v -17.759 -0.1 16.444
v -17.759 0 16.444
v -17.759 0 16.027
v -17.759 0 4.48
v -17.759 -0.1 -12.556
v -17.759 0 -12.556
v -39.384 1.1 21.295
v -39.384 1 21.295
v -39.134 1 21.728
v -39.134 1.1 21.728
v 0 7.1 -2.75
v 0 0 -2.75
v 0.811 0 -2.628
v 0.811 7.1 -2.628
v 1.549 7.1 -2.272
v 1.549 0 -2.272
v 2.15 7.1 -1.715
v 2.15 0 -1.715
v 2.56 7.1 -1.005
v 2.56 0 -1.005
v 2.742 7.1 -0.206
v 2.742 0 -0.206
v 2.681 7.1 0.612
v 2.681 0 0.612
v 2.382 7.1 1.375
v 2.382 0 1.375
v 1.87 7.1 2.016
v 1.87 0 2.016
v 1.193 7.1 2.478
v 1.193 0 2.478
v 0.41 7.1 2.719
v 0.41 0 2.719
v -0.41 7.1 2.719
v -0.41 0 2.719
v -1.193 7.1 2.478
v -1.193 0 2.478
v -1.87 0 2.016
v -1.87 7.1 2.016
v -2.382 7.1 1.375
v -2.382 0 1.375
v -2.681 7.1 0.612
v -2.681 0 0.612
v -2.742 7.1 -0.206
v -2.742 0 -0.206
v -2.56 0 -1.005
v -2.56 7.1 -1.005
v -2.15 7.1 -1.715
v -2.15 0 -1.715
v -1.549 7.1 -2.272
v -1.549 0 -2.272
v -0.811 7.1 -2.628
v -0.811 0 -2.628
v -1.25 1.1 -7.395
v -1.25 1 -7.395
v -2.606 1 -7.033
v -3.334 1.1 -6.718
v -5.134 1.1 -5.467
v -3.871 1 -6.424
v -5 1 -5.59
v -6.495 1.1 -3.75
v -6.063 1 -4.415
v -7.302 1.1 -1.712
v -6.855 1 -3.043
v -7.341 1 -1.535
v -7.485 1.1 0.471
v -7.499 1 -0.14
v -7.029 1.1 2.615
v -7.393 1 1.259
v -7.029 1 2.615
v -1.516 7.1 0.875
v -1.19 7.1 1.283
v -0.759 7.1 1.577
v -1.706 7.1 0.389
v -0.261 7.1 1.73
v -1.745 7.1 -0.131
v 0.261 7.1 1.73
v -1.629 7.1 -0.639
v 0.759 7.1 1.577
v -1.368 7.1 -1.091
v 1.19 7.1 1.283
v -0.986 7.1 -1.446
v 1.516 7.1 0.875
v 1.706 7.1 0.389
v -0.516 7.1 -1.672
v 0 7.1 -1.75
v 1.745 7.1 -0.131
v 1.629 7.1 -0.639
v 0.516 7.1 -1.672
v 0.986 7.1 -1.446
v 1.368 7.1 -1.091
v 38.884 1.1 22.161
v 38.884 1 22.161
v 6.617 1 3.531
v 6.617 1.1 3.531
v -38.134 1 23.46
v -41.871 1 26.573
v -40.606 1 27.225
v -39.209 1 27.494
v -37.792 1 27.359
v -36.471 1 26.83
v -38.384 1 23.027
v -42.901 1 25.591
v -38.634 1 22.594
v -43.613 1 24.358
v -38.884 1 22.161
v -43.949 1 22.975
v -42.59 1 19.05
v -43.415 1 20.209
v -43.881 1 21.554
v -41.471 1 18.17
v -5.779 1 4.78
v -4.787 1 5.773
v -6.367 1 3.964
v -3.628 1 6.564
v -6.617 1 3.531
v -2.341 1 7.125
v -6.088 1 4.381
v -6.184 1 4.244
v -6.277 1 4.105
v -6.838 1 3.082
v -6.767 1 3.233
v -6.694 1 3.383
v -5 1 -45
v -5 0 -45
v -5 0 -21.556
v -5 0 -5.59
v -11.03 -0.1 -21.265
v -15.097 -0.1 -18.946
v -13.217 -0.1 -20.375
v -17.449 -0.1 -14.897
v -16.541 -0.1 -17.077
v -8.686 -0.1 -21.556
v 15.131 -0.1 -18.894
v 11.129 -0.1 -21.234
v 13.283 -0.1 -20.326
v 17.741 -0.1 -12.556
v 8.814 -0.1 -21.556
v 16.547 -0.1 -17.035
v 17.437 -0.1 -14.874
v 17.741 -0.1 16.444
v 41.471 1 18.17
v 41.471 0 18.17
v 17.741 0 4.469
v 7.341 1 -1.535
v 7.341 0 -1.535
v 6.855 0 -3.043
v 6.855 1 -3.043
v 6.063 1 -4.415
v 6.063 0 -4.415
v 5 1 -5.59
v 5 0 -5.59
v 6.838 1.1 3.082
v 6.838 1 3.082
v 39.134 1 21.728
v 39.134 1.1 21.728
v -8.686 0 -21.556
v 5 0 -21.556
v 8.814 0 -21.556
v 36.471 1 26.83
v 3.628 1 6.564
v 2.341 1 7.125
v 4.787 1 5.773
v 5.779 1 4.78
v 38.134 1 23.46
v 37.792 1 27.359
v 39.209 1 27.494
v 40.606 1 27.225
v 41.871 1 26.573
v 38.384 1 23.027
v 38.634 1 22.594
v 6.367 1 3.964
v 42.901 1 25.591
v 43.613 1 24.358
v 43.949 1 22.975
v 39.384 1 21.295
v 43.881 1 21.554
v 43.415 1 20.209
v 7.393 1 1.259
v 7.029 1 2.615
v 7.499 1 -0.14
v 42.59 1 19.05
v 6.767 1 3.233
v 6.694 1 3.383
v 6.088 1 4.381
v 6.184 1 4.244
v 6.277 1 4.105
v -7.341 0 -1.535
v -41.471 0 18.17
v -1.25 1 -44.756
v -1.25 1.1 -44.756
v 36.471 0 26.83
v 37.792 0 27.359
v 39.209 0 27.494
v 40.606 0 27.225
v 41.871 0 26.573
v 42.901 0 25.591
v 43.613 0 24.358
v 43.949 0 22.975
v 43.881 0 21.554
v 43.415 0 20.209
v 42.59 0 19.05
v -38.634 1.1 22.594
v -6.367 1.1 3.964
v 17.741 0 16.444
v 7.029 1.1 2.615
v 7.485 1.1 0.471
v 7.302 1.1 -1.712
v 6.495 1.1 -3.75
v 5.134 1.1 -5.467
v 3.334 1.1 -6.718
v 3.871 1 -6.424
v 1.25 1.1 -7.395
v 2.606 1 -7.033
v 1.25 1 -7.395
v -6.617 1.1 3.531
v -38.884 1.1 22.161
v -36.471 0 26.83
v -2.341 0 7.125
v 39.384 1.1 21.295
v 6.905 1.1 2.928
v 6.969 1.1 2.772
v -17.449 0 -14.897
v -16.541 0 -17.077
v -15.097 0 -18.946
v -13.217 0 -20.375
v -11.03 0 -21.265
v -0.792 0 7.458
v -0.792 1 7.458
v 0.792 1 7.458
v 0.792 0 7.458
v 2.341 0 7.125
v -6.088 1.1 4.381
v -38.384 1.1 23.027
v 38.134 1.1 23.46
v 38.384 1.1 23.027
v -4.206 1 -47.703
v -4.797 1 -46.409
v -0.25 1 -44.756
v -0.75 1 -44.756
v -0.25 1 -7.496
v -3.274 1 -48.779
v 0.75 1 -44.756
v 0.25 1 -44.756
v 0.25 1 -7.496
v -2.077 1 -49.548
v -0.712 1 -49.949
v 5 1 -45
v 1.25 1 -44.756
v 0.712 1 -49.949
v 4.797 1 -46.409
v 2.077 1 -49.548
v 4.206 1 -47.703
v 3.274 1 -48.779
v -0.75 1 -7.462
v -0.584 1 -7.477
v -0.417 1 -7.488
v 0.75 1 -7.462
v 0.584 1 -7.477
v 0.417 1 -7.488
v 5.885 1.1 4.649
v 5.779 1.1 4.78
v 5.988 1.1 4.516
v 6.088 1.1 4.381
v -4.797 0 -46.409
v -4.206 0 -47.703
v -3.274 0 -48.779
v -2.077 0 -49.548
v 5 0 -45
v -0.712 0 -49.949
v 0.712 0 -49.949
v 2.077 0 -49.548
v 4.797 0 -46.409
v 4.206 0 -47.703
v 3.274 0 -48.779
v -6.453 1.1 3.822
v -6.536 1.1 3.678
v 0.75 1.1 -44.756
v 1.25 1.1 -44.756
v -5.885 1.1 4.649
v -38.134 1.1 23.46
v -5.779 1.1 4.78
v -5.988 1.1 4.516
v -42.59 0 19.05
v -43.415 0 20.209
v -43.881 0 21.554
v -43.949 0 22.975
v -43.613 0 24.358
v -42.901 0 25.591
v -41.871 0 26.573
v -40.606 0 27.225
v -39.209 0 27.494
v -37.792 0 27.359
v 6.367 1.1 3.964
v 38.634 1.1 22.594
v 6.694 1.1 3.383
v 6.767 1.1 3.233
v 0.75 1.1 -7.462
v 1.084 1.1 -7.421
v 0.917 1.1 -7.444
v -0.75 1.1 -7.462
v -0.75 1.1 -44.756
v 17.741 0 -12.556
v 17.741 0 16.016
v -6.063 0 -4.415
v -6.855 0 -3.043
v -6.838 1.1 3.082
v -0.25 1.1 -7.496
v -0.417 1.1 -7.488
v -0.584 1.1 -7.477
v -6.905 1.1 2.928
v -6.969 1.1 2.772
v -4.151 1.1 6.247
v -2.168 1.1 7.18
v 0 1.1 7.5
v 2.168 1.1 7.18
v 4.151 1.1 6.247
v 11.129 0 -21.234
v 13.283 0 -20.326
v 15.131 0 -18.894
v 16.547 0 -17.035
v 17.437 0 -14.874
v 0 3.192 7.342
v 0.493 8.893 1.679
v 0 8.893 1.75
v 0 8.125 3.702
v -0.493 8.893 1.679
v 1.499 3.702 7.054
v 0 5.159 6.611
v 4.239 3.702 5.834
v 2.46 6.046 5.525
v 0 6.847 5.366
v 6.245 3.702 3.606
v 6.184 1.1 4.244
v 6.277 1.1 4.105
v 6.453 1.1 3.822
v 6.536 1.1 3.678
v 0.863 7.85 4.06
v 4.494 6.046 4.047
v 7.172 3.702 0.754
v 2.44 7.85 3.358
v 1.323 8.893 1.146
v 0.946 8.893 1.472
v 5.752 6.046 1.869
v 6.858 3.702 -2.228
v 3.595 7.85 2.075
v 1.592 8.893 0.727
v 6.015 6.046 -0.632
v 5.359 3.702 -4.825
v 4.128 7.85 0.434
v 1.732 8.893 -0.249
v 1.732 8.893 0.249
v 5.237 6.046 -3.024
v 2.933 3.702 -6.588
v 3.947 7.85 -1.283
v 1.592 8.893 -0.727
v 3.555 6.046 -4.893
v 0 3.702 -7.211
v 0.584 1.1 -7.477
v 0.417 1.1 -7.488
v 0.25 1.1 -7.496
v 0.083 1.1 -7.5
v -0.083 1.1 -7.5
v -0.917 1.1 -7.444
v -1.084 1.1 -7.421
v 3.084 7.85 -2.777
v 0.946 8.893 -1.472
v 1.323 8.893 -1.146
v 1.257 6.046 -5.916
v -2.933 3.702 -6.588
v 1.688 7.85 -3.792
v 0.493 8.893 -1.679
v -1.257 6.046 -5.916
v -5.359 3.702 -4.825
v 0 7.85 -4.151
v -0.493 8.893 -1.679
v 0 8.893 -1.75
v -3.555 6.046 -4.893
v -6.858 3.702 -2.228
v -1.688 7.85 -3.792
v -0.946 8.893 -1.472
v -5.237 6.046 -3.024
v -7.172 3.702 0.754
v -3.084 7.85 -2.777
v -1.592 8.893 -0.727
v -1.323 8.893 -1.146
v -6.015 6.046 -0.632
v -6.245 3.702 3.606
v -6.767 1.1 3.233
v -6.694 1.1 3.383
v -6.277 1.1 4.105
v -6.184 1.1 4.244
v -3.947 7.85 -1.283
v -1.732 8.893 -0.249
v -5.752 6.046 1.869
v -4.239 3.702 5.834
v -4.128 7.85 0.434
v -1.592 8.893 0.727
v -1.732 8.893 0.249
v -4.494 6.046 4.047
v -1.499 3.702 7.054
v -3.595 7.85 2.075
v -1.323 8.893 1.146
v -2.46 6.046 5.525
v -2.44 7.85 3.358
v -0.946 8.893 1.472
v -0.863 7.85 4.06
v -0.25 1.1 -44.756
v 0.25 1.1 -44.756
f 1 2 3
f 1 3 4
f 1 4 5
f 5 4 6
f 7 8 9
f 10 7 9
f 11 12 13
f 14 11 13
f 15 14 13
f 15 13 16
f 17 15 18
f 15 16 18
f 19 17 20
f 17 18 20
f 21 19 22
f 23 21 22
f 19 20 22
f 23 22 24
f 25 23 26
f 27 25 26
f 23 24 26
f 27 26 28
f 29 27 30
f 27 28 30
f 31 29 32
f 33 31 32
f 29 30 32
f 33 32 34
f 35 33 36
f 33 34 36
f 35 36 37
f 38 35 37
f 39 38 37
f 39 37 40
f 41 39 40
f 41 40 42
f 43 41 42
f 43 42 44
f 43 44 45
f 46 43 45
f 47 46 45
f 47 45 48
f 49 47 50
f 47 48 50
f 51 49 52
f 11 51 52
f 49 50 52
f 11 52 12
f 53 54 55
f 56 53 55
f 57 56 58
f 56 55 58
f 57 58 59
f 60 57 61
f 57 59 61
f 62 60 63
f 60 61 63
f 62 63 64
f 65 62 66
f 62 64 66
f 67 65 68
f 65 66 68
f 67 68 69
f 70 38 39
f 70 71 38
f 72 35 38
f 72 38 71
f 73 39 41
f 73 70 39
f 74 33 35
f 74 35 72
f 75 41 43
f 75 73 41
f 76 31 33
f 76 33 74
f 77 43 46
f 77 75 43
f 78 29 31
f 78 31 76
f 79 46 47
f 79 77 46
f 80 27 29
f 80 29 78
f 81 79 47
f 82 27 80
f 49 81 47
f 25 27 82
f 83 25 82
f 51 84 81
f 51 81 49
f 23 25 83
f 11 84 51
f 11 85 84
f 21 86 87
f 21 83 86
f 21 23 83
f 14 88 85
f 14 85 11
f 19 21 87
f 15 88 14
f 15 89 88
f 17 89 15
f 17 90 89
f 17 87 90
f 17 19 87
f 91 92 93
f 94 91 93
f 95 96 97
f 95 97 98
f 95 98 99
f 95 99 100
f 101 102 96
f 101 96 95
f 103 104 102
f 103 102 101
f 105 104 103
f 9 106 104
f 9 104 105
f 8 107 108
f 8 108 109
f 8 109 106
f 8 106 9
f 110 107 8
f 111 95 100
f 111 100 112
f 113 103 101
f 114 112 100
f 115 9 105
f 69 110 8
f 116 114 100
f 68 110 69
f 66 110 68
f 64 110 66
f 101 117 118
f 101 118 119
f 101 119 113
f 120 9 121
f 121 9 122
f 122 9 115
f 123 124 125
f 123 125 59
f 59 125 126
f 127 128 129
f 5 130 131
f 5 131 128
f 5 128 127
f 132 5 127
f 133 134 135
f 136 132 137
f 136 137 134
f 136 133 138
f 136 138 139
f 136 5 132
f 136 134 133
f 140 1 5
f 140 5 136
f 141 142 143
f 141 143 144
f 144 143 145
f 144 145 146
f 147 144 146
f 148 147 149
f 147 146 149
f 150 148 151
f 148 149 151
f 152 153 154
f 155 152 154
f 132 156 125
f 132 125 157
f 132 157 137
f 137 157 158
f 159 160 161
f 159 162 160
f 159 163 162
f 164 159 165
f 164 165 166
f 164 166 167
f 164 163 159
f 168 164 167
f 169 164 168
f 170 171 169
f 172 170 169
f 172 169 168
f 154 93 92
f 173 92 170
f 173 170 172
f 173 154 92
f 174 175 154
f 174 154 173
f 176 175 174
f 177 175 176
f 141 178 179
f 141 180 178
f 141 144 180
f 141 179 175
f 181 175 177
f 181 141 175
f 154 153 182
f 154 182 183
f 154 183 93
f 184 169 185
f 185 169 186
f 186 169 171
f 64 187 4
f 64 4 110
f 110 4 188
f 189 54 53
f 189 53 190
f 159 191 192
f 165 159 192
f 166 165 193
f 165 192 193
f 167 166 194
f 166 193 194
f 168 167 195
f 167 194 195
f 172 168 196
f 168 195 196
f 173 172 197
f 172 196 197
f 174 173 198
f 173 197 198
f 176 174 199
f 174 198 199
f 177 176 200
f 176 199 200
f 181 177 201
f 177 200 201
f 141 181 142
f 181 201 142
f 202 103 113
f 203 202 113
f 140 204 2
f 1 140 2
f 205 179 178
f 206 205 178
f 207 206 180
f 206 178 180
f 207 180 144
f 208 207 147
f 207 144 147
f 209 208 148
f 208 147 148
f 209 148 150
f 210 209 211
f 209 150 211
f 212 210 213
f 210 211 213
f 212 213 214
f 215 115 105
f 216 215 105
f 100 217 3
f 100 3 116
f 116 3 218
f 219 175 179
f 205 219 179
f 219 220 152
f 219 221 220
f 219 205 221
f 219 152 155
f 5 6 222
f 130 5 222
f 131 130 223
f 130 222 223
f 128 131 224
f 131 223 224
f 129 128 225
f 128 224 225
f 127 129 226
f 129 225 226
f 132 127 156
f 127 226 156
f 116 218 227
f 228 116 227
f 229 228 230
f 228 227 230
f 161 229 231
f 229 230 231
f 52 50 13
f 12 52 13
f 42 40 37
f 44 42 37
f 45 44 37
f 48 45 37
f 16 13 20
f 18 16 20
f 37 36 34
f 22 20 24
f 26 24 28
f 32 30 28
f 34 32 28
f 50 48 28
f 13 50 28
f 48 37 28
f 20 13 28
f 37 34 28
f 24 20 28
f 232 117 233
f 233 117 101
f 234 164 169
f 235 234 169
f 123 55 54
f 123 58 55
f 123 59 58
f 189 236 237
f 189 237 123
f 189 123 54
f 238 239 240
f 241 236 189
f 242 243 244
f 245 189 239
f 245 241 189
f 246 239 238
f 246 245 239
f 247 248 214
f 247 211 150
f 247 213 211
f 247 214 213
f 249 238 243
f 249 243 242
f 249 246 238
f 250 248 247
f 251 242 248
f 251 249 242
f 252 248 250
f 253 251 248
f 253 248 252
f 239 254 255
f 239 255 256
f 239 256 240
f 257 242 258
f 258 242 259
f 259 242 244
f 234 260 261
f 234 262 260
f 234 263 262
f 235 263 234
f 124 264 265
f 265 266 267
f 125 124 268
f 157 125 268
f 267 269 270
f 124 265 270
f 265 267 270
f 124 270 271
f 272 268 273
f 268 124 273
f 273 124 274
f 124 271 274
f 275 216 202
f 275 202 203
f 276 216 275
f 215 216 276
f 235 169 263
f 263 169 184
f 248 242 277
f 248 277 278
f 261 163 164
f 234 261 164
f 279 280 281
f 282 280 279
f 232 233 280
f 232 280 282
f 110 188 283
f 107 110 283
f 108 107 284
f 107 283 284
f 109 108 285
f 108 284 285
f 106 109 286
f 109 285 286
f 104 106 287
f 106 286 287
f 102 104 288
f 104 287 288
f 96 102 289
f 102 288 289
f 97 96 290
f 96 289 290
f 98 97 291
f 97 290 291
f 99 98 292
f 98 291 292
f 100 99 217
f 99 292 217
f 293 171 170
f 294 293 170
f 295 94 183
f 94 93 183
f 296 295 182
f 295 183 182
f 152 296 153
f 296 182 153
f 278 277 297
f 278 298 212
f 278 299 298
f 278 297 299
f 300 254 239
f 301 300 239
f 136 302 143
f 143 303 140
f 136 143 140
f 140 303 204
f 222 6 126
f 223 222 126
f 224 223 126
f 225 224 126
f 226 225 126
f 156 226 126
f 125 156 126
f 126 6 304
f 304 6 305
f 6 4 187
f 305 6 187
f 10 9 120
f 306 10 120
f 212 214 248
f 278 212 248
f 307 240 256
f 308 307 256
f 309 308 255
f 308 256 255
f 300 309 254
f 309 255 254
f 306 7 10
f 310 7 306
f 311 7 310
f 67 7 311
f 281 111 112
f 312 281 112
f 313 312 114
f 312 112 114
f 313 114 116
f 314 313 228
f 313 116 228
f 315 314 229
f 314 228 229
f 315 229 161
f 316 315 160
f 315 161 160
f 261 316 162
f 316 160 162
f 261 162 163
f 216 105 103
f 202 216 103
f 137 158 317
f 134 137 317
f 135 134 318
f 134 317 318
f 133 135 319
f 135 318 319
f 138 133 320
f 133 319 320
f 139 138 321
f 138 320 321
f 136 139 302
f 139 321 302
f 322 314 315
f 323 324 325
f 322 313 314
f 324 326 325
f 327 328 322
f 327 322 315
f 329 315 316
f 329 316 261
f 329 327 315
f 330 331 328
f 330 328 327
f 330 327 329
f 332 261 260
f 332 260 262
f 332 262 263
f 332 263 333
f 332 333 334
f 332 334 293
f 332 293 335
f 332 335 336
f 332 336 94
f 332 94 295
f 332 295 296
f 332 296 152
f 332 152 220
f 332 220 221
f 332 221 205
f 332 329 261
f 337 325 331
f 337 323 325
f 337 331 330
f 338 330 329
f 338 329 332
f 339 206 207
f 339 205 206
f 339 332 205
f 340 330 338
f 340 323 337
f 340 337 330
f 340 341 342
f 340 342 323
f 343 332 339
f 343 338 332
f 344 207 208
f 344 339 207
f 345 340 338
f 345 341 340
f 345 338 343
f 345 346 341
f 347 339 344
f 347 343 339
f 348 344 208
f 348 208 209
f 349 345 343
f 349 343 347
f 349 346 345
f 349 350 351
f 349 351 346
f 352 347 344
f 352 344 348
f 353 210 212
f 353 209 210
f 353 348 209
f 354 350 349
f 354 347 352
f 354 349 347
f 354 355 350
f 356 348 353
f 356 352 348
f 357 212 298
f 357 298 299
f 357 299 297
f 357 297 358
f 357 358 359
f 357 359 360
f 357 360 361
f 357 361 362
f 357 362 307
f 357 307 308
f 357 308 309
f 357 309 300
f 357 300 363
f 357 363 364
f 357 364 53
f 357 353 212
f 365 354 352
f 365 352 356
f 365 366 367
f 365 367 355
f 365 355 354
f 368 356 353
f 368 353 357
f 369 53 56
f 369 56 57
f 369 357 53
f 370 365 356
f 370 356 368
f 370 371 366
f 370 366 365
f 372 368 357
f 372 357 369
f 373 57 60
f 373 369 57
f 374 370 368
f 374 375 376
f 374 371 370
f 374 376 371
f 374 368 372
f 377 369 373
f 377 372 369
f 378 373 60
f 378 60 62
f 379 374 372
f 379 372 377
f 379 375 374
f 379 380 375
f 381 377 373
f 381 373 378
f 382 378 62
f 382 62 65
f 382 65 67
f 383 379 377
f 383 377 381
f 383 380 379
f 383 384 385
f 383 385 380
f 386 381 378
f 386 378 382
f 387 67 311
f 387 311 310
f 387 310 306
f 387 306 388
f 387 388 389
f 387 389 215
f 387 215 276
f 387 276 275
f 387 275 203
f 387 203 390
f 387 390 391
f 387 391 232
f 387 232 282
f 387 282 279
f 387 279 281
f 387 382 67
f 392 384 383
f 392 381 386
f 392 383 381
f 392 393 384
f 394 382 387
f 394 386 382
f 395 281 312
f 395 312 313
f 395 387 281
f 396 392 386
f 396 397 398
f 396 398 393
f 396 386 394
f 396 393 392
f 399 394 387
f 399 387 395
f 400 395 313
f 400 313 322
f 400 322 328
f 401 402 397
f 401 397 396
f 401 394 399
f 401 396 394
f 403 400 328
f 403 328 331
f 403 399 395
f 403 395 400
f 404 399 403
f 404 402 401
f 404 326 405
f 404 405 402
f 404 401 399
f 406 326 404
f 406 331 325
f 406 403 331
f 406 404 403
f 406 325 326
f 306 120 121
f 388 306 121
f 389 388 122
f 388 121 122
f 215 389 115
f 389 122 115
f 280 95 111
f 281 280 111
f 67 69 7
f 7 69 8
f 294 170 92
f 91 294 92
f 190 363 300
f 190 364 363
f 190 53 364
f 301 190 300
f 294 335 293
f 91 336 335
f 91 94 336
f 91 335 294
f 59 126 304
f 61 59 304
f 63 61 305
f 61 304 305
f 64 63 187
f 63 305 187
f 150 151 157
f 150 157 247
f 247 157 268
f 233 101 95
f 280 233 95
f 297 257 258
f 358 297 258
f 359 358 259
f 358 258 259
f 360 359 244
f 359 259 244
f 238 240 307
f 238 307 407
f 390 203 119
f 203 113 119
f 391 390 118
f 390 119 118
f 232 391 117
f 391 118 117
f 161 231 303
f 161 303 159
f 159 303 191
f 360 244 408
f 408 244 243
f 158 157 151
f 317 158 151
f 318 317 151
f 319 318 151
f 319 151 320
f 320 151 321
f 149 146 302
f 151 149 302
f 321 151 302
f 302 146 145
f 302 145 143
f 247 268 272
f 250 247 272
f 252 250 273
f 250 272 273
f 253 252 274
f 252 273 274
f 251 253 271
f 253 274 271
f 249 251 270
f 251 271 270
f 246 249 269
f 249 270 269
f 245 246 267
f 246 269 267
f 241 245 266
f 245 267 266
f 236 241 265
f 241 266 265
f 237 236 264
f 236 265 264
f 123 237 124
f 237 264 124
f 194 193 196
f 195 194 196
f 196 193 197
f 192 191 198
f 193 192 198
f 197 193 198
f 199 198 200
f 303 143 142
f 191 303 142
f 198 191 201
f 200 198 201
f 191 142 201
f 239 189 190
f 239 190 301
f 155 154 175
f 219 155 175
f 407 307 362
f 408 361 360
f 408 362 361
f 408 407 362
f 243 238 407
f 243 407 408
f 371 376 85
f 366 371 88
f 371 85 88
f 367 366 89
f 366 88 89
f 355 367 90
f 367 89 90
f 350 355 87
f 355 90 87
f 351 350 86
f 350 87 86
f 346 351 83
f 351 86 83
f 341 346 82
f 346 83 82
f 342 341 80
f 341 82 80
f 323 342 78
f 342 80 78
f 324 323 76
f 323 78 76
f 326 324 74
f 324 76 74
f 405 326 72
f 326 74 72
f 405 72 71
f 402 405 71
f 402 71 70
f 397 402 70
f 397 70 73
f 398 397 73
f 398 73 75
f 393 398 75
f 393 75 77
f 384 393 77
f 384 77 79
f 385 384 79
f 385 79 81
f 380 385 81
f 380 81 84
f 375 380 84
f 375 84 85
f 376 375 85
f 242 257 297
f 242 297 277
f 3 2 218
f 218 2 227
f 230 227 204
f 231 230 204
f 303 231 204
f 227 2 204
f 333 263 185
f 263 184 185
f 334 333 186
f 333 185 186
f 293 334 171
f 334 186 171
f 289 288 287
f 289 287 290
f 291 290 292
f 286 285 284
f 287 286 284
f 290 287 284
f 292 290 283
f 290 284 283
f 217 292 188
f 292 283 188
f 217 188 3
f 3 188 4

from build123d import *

# Parameters (mm, degrees)
BOSS_EXTRUDE1_DEPTH = 1
SKETCH2_R           = 7.5
BOSS_EXTRUDE2_DEPTH = 0.1
DOME1_FACE_RADIUS   = 7.5
DOME1_HEIGHT        = 8
SKETCH3_R           = 1.75
CUT_EXTRUDE1_DEPTH  = 68.203209981
SKETCH5_R           = 2.75
CUT_EXTRUDE2_DEPTH  = 7.1
SKETCH6_W           = 0.5
SKETCH6_H           = 38.067336288
BOSS_EXTRUDE3_DEPTH = 0.1
BOSS_EXTRUDE6_DEPTH = 0.1


with BuildPart() as part:
    # Sketch1 → Boss-Extrude1 (new body)
    with BuildSketch(Plane(origin=(0, 0, 0), x_dir=(1, 0, 0), z_dir=(0, 1, 0))):
        with BuildLine():
            Line((-5, 45), (-5, 5.590169944))
            ThreePointArc((-5, 5.590169944), (-6.495190528, 3.75), (-7.341229183, 1.535042047))
            Line((-7.341229183, 1.535042047), (-41.47114317, -18.169872981))
            ThreePointArc((-41.47114317, -18.169872981), (-43.301270189, -25), (-36.47114317, -26.830127019))
            Line((-36.47114317, -26.830127019), (-2.341229183, -7.125211991))
            ThreePointArc((-2.341229183, -7.125211991), (0, -7.5), (2.341229183, -7.125211991))
            Line((2.341229183, -7.125211991), (36.47114317, -26.830127019))
            ThreePointArc((36.47114317, -26.830127019), (43.301270189, -25), (41.47114317, -18.169872981))
            Line((41.47114317, -18.169872981), (7.341229183, 1.535042047))
            ThreePointArc((7.341229183, 1.535042047), (6.495190528, 3.75), (5, 5.590169944))
            Line((5, 5.590169944), (5, 45))
            ThreePointArc((5, 45), (0, 50), (-5, 45))
        make_face()
    extrude(amount=BOSS_EXTRUDE1_DEPTH)

    # Sketch2 → Boss-Extrude2 (add)
    with BuildSketch(Plane(origin=(0, 1, 0), x_dir=(1, 0, 0), z_dir=(0, 1, 0))):
        with Locations(Location((0, 0, 0), (0, 0, 48.189685104))):
            Circle(SKETCH2_R)
    extrude(amount=BOSS_EXTRUDE2_DEPTH)

    # Dome1: a dome of height H over a round flat face of radius A is a cap of a sphere of radius (A * A + H * H) / (2 * H)
    dome1_r = (DOME1_FACE_RADIUS * DOME1_FACE_RADIUS + DOME1_HEIGHT * DOME1_HEIGHT) / (2 * DOME1_HEIGHT)
    dome1_base = Plane((0, 1.1, 0), z_dir=(0, 1, 0))
    with Locations(dome1_base.offset(DOME1_HEIGHT - dome1_r)):
        dome1_ball = Sphere(dome1_r, mode=Mode.PRIVATE)
    add(split(dome1_ball, bisect_by=dome1_base, keep=Keep.TOP, mode=Mode.PRIVATE))

    # Sketch3 → Cut-Extrude1 (cut, through all)
    with BuildSketch(Plane.XZ):
        with Locations(Location((0, 0, 0), (0, 0, 270))):
            Circle(SKETCH3_R)
    extrude(amount=-CUT_EXTRUDE1_DEPTH, mode=Mode.SUBTRACT)

    # Sketch5 → Cut-Extrude2 (cut)
    with BuildSketch(Plane.XZ):
        with Locations(Location((0, 0, 0), (0, 0, 270))):
            Circle(SKETCH5_R)
    extrude(amount=-CUT_EXTRUDE2_DEPTH, mode=Mode.SUBTRACT)

    # Sketch6 → Boss-Extrude3 (add)
    with BuildSketch(Plane(origin=(0, 1, 0), x_dir=(1, 0, 0), z_dir=(0, 1, 0))):
        with Locations((-1, 25.721859363)):
            Rectangle(SKETCH6_W, SKETCH6_H)
        with Locations((0, 25.721859363)):
            Rectangle(SKETCH6_W, SKETCH6_H)
        with Locations((1, 25.721859363)):
            Rectangle(SKETCH6_W, SKETCH6_H)
        Polygon((39.384423781, -21.295231999), (6.417143501, -2.261563855), (6.167143501, -2.694576557), (39.134423781, -21.728244701), align=None)
        Polygon((38.884423781, -22.161257403), (5.917143501, -3.127589259), (5.667143501, -3.560601961), (38.634423781, -22.594270105), align=None)
        Polygon((38.384423781, -23.027282807), (5.417143501, -3.993614663), (5.167143501, -4.426627364), (38.134423781, -23.460295508), align=None)
        Polygon((-38.134423781, -23.460295508), (-5.167143501, -4.426627364), (-5.417143501, -3.993614663), (-38.384423781, -23.027282807), align=None)
        Polygon((-38.634423781, -22.594270105), (-5.667143501, -3.560601961), (-5.917143501, -3.127589259), (-38.884423781, -22.161257403), align=None)
        Polygon((-39.134423781, -21.728244701), (-6.167143501, -2.694576557), (-6.417143501, -2.261563855), (-39.384423781, -21.295231999), align=None)
    extrude(amount=BOSS_EXTRUDE3_DEPTH)

    # Sketch11 → Boss-Extrude6 (add)
    with BuildSketch(Plane.XZ):
        with BuildLine():
            Line((17.740956204, 16.443798031), (-17.759043796, 16.443798031))
            Line((-17.759043796, 16.443798031), (-17.759043796, -12.556201969))
            ThreePointArc((-17.759043796, -12.556201969), (-15.097202282, -18.94586135), (-8.686211126, -21.555907264))
            Line((-8.686211126, -21.555907264), (8.813788874, -21.555907264))
            ThreePointArc((8.813788874, -21.555907264), (15.130615586, -18.894360454), (17.740956204, -12.556201969))
            Line((17.740956204, -12.556201969), (17.740956204, 16.443798031))
        make_face()
    extrude(amount=BOSS_EXTRUDE6_DEPTH)


solid = part.part
